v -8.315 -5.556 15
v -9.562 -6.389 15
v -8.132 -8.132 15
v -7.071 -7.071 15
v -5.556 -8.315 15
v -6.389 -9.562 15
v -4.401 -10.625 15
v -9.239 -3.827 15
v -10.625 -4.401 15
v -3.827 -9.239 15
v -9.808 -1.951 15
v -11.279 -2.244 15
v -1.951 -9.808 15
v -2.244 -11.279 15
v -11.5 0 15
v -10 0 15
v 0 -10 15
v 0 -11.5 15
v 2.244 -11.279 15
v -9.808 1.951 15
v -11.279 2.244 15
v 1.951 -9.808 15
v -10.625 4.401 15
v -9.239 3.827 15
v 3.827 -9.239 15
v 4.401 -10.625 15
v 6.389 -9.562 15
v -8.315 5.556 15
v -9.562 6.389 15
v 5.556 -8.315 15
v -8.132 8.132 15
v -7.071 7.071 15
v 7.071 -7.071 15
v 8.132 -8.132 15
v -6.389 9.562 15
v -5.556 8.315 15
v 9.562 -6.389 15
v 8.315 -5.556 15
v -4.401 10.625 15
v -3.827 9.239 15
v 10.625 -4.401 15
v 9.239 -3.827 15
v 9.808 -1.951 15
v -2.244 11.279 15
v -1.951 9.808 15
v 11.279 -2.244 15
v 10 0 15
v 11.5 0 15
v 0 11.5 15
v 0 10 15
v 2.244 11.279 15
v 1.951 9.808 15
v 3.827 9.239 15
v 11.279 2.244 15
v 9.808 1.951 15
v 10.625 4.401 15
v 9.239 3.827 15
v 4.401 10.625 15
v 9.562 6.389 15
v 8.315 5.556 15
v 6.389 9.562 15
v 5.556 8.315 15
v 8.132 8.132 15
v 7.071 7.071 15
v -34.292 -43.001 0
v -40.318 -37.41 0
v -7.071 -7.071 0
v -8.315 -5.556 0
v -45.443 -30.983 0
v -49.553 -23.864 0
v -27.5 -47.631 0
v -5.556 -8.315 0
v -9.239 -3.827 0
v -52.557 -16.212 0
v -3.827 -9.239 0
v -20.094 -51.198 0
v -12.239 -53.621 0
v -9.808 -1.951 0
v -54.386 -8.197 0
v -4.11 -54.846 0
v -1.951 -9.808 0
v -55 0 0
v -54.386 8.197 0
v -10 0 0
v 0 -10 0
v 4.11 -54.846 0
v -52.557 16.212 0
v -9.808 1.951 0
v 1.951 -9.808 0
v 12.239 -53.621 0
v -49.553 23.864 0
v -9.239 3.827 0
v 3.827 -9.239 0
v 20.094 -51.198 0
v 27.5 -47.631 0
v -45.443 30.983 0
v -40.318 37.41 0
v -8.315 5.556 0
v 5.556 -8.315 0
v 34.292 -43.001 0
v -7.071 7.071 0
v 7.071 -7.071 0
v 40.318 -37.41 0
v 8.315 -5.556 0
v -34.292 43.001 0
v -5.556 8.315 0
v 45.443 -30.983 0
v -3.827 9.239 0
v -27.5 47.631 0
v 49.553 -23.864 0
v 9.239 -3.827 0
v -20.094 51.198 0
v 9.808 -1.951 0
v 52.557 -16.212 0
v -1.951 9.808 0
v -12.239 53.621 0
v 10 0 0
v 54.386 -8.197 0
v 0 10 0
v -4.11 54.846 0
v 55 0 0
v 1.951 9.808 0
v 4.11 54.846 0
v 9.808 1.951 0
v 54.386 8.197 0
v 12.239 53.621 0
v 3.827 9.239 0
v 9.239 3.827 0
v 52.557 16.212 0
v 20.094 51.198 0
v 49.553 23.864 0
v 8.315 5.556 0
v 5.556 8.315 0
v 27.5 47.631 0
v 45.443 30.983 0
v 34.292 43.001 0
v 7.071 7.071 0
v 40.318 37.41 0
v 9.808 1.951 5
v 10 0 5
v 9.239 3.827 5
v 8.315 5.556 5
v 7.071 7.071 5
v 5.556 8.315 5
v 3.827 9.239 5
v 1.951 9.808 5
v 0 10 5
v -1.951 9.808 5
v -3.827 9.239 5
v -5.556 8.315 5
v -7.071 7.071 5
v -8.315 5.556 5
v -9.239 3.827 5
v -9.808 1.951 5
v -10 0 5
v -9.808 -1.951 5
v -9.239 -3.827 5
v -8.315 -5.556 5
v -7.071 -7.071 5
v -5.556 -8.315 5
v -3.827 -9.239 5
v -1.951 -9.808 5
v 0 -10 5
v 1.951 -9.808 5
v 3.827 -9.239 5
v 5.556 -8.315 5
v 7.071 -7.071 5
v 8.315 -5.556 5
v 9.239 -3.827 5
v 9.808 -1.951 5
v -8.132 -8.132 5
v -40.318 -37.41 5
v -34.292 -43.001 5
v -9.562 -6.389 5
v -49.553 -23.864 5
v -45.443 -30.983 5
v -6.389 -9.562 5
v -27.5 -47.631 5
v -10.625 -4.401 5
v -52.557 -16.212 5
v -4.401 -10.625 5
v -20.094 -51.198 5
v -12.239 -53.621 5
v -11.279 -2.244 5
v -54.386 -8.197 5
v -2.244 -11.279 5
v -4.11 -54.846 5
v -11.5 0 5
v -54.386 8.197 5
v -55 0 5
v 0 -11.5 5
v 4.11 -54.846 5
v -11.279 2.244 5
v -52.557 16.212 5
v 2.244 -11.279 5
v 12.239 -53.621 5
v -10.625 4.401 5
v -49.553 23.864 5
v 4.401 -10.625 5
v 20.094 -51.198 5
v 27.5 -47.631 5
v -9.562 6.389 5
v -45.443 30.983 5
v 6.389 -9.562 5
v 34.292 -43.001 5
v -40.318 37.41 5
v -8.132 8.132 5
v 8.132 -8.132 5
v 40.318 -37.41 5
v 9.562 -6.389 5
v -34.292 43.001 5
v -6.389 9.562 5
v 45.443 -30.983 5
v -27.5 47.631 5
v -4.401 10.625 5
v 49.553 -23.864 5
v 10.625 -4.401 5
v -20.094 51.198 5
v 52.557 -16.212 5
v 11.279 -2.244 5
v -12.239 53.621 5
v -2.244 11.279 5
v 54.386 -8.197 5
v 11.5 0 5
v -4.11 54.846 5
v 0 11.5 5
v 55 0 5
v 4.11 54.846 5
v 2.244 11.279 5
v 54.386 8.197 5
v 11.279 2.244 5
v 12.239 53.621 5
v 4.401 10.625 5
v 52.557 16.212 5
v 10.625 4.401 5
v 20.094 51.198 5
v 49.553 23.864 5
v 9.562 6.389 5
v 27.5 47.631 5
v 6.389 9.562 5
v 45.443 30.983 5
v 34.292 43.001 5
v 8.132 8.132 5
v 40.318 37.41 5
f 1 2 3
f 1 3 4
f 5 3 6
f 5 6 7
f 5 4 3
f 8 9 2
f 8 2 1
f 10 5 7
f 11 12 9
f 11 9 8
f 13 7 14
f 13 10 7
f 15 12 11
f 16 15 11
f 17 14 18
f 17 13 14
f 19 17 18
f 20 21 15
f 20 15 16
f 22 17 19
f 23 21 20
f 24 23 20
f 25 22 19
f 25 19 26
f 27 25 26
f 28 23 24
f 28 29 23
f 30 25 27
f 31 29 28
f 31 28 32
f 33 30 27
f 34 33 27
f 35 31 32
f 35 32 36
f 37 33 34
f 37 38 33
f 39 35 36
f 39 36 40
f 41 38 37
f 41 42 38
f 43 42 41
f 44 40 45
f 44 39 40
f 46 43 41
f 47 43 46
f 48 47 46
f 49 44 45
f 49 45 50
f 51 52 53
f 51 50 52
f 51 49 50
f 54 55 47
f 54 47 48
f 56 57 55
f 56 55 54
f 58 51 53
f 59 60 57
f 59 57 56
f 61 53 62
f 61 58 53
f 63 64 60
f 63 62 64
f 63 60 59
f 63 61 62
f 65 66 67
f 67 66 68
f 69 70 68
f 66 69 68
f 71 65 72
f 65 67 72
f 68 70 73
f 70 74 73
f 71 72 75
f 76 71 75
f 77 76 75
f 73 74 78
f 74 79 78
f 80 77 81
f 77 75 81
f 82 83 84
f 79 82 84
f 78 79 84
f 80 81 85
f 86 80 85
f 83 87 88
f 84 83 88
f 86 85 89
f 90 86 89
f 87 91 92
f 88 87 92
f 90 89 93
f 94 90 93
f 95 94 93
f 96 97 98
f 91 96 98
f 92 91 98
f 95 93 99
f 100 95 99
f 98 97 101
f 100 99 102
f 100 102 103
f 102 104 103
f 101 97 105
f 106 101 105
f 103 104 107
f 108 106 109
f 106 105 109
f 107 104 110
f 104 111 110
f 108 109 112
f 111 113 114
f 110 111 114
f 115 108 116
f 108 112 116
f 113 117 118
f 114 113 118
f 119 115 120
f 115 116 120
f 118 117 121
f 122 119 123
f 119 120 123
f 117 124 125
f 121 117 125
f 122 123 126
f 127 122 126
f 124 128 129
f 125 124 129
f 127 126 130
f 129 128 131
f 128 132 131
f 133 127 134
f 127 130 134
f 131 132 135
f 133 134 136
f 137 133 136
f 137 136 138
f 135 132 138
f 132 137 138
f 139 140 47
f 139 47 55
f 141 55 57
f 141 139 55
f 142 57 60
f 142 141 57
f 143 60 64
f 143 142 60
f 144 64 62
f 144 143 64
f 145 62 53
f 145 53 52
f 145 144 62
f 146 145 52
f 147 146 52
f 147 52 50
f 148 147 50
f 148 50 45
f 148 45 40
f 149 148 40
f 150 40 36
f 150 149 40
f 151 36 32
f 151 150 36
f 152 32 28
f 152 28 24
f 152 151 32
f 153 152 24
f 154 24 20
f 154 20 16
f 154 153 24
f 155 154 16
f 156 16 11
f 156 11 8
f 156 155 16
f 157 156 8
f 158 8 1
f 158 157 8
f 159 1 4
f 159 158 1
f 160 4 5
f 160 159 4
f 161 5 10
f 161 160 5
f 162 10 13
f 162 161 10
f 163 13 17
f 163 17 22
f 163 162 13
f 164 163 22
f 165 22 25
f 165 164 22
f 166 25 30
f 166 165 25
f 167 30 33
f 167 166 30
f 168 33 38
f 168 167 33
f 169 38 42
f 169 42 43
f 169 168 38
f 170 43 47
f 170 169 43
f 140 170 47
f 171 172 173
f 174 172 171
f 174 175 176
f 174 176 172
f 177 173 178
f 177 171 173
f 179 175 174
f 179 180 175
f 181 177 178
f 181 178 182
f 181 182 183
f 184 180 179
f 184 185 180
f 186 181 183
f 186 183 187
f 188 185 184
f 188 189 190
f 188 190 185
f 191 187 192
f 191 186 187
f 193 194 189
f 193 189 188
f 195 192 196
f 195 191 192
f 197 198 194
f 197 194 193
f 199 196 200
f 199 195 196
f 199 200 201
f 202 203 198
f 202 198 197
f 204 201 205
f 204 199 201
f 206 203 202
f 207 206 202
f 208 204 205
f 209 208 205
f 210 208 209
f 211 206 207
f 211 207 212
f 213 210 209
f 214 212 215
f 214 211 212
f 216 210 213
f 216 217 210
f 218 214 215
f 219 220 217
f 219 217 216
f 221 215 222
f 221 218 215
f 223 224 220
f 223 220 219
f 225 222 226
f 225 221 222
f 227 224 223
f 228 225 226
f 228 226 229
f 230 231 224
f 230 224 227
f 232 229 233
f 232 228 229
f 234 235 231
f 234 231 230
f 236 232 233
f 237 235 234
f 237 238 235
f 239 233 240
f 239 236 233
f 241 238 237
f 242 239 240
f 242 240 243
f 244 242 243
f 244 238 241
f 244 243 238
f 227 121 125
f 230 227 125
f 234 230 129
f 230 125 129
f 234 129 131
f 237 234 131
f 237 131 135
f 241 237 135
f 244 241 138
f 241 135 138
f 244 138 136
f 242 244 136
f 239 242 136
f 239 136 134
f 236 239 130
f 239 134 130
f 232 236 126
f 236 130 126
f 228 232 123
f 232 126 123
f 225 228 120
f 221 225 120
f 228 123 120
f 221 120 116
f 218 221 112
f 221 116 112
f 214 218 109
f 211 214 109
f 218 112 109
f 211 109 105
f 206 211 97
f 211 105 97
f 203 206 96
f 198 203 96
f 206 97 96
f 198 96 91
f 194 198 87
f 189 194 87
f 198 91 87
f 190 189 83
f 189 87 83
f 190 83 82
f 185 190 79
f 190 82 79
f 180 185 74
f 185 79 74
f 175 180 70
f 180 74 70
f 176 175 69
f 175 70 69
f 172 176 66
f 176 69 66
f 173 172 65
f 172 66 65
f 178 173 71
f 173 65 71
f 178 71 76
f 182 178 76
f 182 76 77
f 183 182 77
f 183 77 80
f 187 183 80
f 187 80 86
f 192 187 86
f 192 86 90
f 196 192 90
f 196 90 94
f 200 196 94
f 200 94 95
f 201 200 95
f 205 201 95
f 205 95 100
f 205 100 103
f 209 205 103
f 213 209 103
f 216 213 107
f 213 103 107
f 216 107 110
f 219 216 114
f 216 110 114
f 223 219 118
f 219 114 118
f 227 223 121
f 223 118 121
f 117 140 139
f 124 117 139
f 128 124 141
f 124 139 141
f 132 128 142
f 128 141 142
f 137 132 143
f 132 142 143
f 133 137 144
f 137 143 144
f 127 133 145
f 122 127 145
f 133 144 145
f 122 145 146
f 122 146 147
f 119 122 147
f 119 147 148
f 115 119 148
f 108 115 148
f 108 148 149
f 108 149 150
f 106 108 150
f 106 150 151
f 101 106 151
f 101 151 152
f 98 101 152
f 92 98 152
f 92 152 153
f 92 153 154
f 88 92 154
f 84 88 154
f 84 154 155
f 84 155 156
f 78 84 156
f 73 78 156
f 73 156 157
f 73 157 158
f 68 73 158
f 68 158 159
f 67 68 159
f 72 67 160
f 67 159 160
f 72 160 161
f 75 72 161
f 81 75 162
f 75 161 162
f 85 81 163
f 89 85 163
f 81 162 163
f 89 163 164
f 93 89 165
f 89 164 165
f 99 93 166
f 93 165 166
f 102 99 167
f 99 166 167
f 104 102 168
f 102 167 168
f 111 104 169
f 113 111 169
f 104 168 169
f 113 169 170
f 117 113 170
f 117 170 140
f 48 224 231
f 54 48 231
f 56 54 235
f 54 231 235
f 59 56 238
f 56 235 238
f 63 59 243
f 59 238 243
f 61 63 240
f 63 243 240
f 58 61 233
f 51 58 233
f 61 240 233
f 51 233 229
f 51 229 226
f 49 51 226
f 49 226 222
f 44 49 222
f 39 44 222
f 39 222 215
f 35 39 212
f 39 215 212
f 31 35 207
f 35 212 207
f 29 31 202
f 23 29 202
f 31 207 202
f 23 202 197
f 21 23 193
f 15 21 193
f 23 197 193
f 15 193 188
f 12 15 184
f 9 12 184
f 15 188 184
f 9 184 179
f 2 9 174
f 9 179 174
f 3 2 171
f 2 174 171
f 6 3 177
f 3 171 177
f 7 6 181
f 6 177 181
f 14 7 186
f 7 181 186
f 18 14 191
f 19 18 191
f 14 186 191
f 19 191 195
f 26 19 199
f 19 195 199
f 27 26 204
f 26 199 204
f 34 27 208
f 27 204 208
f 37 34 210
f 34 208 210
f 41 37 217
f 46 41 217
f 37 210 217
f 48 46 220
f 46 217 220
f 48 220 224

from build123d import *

# Parameters (mm, degrees)
SKETCH1_R           = 55
BOSS_EXTRUDE1_DEPTH = 5
SKETCH2_R           = 11.5
SKETCH2_R_2         = 10
BOSS_EXTRUDE2_DEPTH = 10
SKETCH3_R           = 10
CUT_EXTRUDE1_DEPTH  = 79.421935707


with BuildPart() as part:
    # Sketch1 → Boss-Extrude1 (new body)
    with BuildSketch(Plane.XY):
        Circle(SKETCH1_R)
    extrude(amount=BOSS_EXTRUDE1_DEPTH)

    # Sketch2 → Boss-Extrude2 (add)
    with BuildSketch(Plane.XY.offset(5)):
        Circle(SKETCH2_R)
        Circle(SKETCH2_R_2, mode=Mode.SUBTRACT)
    extrude(amount=BOSS_EXTRUDE2_DEPTH)

    # Sketch3 → Cut-Extrude1 (cut, through all)
    with BuildSketch(Plane.XY.offset(5)):
        Circle(SKETCH3_R)
    extrude(amount=-CUT_EXTRUDE1_DEPTH, mode=Mode.SUBTRACT)


solid = part.part
